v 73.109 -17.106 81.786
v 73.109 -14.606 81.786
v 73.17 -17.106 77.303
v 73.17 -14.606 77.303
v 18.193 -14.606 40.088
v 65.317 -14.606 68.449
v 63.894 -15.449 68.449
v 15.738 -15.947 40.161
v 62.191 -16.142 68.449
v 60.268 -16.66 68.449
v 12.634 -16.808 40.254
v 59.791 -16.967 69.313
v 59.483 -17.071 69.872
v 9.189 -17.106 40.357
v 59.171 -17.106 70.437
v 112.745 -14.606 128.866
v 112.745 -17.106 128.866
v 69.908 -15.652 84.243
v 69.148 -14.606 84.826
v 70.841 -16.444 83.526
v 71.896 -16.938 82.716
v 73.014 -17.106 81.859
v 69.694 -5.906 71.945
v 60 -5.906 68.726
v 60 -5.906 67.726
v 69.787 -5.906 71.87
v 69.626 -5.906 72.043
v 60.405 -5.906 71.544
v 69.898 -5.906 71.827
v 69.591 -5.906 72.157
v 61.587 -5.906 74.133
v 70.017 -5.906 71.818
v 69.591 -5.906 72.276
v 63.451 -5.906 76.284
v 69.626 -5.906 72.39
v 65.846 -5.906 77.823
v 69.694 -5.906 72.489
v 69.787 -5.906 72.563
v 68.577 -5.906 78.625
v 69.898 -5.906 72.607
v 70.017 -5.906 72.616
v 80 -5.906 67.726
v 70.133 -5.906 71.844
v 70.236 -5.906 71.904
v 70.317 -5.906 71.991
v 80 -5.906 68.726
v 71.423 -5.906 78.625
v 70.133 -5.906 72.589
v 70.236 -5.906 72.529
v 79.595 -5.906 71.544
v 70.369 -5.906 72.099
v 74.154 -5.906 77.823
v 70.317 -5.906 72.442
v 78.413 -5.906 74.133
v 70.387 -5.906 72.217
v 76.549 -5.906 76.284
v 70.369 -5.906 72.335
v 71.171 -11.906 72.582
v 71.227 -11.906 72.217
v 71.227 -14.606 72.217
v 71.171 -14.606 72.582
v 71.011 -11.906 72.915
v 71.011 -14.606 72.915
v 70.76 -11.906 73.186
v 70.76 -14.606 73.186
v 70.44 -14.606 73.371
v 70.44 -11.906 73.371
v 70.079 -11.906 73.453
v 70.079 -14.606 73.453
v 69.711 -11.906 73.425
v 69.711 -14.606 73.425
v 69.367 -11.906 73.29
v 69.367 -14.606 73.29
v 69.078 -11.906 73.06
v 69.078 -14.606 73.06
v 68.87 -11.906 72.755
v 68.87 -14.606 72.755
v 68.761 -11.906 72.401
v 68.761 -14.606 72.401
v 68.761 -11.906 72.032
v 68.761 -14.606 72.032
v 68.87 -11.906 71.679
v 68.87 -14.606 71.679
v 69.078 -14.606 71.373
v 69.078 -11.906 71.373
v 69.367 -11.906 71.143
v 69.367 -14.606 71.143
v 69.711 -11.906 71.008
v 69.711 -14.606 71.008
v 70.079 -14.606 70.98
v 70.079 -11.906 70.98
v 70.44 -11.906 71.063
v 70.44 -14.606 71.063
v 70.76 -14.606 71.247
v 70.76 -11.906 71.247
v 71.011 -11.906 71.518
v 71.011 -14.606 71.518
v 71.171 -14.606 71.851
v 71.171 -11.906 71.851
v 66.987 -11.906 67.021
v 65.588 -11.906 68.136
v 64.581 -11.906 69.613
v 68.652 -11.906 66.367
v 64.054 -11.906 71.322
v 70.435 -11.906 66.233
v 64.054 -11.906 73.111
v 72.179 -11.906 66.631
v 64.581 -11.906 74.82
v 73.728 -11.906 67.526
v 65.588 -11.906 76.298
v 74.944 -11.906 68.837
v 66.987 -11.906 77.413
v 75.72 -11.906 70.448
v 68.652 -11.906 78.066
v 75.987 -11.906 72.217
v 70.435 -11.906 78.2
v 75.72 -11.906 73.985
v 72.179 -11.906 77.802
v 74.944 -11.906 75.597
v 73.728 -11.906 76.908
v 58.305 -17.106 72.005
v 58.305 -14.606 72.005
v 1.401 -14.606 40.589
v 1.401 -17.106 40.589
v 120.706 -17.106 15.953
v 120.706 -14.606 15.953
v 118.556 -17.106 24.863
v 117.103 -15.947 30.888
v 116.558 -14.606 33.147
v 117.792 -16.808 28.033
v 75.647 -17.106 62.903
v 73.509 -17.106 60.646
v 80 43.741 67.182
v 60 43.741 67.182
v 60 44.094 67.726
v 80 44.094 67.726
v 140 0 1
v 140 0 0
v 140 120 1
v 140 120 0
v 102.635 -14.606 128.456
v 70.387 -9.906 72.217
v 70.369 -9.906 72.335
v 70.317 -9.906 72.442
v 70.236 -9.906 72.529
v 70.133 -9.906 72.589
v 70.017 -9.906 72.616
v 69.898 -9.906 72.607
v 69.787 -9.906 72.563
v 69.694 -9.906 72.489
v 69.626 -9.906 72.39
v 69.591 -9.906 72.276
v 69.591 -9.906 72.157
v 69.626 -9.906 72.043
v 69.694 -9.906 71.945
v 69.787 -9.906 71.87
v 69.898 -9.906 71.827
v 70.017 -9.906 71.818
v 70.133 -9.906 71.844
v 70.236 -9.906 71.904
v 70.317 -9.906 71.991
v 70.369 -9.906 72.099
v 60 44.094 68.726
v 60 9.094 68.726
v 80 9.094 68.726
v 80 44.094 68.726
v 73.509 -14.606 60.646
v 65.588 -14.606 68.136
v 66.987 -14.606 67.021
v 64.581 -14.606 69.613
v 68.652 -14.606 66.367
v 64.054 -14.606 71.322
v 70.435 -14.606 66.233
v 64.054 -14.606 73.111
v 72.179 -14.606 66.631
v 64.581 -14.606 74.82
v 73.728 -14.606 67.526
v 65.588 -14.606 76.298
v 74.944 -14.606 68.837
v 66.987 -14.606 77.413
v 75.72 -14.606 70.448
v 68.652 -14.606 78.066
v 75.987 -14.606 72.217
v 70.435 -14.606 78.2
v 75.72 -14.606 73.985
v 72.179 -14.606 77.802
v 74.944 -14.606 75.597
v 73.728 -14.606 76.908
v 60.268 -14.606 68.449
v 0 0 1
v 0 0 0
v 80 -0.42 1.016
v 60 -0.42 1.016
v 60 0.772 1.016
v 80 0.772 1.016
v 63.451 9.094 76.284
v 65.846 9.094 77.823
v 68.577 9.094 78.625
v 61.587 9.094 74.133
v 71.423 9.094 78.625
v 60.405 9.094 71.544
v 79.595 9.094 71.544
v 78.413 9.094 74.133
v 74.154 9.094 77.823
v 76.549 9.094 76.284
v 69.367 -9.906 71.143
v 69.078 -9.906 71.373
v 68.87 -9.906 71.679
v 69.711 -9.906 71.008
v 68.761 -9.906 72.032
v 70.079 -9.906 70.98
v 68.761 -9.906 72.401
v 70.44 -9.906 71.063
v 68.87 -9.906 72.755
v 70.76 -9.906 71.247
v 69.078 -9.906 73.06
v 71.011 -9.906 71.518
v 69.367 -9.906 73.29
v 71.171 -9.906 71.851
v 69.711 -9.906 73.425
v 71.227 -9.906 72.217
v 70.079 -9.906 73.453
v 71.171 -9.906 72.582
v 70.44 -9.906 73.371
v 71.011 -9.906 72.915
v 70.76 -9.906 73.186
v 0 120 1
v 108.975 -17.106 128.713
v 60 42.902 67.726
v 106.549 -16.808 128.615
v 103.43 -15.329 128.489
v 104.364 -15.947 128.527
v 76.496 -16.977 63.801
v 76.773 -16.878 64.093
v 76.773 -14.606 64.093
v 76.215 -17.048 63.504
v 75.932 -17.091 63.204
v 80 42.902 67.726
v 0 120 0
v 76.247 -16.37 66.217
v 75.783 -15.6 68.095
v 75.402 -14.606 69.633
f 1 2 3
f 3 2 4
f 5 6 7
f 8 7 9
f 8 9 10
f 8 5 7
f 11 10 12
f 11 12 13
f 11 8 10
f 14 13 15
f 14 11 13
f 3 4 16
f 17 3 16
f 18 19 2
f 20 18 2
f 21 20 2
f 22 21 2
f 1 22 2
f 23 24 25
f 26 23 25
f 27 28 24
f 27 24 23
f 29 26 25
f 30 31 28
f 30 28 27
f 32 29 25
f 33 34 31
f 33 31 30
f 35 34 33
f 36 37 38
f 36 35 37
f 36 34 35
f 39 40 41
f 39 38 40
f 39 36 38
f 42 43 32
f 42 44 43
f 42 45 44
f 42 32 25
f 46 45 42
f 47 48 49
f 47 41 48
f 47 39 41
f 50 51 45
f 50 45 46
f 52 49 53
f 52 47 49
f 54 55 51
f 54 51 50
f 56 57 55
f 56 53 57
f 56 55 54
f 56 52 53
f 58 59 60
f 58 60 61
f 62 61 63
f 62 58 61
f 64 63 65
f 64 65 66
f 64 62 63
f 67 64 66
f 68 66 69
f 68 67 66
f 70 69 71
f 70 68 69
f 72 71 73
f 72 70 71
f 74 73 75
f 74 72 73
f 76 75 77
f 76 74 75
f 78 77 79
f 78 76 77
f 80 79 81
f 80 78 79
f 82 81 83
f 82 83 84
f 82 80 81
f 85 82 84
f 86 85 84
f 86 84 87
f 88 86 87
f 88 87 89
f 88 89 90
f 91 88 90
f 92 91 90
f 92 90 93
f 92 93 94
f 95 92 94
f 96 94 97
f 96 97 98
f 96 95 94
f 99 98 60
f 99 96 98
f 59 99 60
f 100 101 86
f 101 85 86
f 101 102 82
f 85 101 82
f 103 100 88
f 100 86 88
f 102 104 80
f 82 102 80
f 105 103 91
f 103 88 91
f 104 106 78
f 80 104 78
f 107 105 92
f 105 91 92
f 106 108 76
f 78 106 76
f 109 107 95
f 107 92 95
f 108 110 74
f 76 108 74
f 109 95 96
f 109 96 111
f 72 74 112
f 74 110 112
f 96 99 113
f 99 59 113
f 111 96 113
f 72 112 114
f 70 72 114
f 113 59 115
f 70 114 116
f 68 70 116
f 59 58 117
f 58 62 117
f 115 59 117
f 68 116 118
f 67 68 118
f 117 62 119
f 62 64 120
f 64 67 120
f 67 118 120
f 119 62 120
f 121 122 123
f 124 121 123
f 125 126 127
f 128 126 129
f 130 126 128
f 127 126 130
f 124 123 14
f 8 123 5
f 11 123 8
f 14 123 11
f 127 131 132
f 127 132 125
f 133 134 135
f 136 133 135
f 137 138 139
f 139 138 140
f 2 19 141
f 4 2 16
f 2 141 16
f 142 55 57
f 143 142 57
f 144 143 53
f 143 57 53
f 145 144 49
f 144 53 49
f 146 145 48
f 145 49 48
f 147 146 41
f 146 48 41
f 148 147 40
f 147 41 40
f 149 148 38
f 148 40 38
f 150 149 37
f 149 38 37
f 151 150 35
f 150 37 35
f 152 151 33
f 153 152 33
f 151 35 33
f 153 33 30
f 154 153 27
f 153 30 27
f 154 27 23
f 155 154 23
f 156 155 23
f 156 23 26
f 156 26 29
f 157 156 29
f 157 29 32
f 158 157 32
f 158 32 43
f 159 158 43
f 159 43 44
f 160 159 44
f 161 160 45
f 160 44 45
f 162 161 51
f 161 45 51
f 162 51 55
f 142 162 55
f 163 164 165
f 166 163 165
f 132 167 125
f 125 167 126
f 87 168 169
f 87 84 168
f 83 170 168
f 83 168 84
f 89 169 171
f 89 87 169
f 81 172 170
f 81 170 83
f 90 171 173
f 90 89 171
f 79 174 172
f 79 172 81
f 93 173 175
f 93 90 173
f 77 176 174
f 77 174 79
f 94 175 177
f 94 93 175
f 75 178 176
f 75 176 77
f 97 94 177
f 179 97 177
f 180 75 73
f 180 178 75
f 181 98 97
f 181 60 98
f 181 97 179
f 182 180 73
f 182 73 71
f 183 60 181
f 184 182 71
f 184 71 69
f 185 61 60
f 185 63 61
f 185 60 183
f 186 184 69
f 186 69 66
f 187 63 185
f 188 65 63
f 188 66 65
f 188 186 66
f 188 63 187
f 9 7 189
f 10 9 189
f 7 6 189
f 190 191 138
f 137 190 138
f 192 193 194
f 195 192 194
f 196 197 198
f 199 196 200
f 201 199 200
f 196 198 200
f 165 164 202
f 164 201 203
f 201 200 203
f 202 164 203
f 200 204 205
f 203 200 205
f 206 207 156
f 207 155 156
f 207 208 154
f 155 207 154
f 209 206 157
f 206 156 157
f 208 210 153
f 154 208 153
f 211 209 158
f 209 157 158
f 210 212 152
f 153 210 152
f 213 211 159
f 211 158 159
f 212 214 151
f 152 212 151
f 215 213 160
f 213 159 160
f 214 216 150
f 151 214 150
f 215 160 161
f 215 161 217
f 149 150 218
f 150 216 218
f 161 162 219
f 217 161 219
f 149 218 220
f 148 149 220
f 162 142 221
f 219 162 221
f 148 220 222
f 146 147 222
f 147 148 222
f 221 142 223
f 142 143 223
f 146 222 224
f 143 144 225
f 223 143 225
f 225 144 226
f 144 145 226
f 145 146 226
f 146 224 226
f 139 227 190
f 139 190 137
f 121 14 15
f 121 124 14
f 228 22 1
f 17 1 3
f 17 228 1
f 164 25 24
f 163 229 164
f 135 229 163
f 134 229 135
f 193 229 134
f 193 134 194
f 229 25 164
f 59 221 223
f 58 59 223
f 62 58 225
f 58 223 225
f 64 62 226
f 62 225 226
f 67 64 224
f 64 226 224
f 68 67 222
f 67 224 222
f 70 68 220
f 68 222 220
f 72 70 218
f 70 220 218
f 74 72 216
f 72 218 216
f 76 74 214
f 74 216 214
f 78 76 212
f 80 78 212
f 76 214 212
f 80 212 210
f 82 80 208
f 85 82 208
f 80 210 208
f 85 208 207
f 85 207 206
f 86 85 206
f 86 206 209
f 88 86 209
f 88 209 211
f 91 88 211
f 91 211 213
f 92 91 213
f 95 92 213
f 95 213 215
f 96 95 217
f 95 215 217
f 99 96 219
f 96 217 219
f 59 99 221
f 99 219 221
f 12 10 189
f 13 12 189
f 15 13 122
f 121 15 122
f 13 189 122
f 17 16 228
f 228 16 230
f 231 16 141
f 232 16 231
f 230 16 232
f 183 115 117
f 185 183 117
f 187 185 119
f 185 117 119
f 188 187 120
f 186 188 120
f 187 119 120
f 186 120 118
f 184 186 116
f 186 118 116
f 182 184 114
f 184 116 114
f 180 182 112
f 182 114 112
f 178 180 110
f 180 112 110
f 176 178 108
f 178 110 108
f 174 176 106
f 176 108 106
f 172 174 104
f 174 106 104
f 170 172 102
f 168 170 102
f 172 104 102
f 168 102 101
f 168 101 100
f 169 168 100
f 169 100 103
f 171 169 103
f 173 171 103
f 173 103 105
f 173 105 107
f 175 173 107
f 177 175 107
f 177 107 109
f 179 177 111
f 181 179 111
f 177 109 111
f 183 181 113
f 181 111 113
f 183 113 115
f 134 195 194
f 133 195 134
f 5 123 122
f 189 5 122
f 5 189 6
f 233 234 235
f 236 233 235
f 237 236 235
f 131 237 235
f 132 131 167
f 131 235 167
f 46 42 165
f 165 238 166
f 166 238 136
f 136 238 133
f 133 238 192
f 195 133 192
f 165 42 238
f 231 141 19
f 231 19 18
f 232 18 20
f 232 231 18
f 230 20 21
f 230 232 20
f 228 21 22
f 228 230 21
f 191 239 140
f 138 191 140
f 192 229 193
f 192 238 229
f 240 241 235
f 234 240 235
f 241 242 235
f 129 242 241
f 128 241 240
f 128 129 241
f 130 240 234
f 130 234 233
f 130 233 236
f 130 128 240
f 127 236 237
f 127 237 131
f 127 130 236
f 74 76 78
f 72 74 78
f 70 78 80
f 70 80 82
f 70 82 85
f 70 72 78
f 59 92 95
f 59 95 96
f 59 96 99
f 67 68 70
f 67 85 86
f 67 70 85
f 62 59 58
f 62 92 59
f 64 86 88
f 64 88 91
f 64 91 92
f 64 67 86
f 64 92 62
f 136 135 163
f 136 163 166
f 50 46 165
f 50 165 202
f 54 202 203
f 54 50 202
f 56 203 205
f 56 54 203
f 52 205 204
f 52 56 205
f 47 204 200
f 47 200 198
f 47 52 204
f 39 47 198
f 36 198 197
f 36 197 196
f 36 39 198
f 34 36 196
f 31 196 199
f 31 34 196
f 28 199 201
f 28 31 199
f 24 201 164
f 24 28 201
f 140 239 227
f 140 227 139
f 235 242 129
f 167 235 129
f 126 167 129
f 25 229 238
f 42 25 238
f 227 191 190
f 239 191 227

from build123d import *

# Parameters (mm, degrees)
F0_W           = 140
F0_H           = 120
F1_DEPTH       = 1
F4_DEPTH       = 10
F5_W           = 20
F5_H           = 50
F6_DEPTH       = 1
F8_DEPTH       = 15
F9_R           = 0.4
F10_DEPTH      = 4
F11_R          = 1.2398278846
F12_DEPTH      = 2
F13_R          = 6
F13_R_2        = 1.2398278846
F14_DEPTH      = 2.7
F16_DEPTH      = 2.5
F17_T1_DEPTH   = 79.366985862
F17_2_T1_DEPTH = 79.366985862
F17_3_T1_DEPTH = 79.366985862


# Not quite as in the source:
# - a fillet or chamfer that OpenCascade refuses, or shapes differently, is made with other operations: its cross-section is extruded or revolved along the edge and cut away or added


with BuildPart() as f1:
    # F0 (on Top) → F1 (new body)
    with BuildSketch(Plane.XY):
        with Locations((70, 60)):
            Rectangle(F0_W, F0_H)
    extrude(amount=F1_DEPTH)


with BuildPart() as f4:
    # F3 (on offset) → F4 (new body, symmetric)
    with BuildSketch(Plane.YZ.offset(70)):
        Polygon((-0.4200659473, 1.0160847374), (0.7722973455, 1.0160847374), (43.7408067697, 67.1817869472), (44.0944994946, 67.7264259822), (42.9021362018, 67.7264259822), align=None)
    extrude(amount=F4_DEPTH, both=True)

    # F5 (on face) → F6 (join)
    with BuildSketch(Plane.XY.offset(67.7264259822)):
        with Locations((70, 19.0944994946)):
            Rectangle(F5_W, F5_H)
    extrude(amount=F6_DEPTH)

    # F7 (on face) → F8 (join)
    with BuildSketch(Plane.XZ.offset(5.9055005054)):
        with BuildLine():
            Line((60, 68.7264259822), (80, 68.7264259822))
            ThreePointArc((80, 68.7264259822), (70, 78.7264259822), (60, 68.7264259822))
        make_face()
    extrude(amount=-F8_DEPTH)

    # F9 (on face) → F10 (join)
    with BuildSketch(Plane.XZ.offset(5.9055005054)):
        with Locations((69.9867457151, 72.2166821361)):
            Circle(F9_R)
    extrude(amount=F10_DEPTH)

    # F11 (on face) → F12 (join)
    with BuildSketch(Plane.XZ.offset(9.9055005054)):
        with Locations((69.9867457151, 72.2166821361)):
            Circle(F11_R)
    extrude(amount=F12_DEPTH)


with BuildPart() as f14:
    # F13 (on face) → F14 (new body)
    with BuildSketch(Plane.XZ.offset(11.9055005054)):
        with Locations((69.9867457151, 72.2166821361)):
            Circle(F13_R)
        with Locations((69.9867457151, 72.2166821361)):
            Circle(F13_R_2, mode=Mode.SUBTRACT)
    extrude(amount=F14_DEPTH)


with BuildPart() as f16:
    # F15 (on face) → F16 (new body)
    with BuildSketch(Plane.XZ.offset(14.6055005054)):
        Polygon((116.5578424183, 33.1474154847), (75.4019039591, 69.6328746368), (76.7731679631, 64.0930237523), (73.5093057156, 60.6463849545), (120.7056262574, 15.9529030212), align=None)
    extrude(amount=F16_DEPTH)

    # F17: fillet of radius 6 on 1 edges, made by hand

    # F17_s2 → F17_t1 (cut)
    with BuildSketch(Plane(origin=(57.9277089102, 0, -51.3539269506), x_dir=(0, 1, 0), z_dir=(-0.7482897902, 0, 0.6633719846))):
        with BuildLine():
            ThreePointArc((-14.6055005054, -102.1250798215), (-16.4440396314, -99.9902954366), (-17.1055005054, -97.2516826491))
            Line((-17.1055005054, -97.2516826491), (-17.1055005054, -102.1250798215))
            Line((-17.1055005054, -102.1250798215), (-14.6055005054, -102.1250798215))
        make_face()
    extrude(amount=F17_T1_DEPTH, mode=Mode.SUBTRACT)


with BuildPart() as f16b:
    # F15 (on face) → F16, piece 2 (new body)
    with BuildSketch(Plane.XZ.offset(14.6055005054)):
        Polygon((73.1090417788, 81.7856717816), (73.1698371178, 77.3027345465), (112.7452876158, 128.8661296819), (102.6347893563, 128.4564783105), (69.1478697041, 84.825913196), align=None)
    extrude(amount=F16_DEPTH)

    # F17#2: fillet of radius 6 on 1 edges, made by hand

    # F17_2_s2 → F17_2_t1 (cut)
    with BuildSketch(Plane(origin=(107.5084414965, 0, 140.0742172108), x_dir=(0, 1, 0), z_dir=(-0.6088530846, 0, -0.7932830021))):
        with BuildLine():
            ThreePointArc((-14.6055005054, 3.2073107645), (-16.4440396314, 5.3420951494), (-17.1055005054, 8.0807079369))
            Line((-17.1055005054, 8.0807079369), (-17.1055005054, 3.2073107645))
            Line((-17.1055005054, 3.2073107645), (-14.6055005054, 3.2073107645))
        make_face()
    extrude(amount=F17_2_T1_DEPTH, mode=Mode.SUBTRACT)


with BuildPart() as f16c:
    # F15 (on face) → F16, piece 3 (new body)
    with BuildSketch(Plane.XZ.offset(14.6055005054)):
        Polygon((18.1934121118, 40.0880810557), (65.3174607263, 68.4486882808), (60.2683858732, 68.4486882808), (58.3051553434, 72.0047285657), (1.4012531219, 40.5890332532), align=None)
    extrude(amount=F16_DEPTH)

    # F17#3: fillet of radius 6 on 1 edges, made by hand

    # F17_3_s2 → F17_3_t1 (cut)
    with BuildSketch(Plane(origin=(20.6282983072, 0, 12.4147029641), x_dir=(0, 1, 0), z_dir=(0.8568008839, 0, 0.5156474041))):
        with BuildLine():
            ThreePointArc((-14.6055005054, 24.9661175553), (-16.4440396314, 27.1009019401), (-17.1055005054, 29.8395147277))
            Line((-17.1055005054, 29.8395147277), (-17.1055005054, 24.9661175553))
            Line((-17.1055005054, 24.9661175553), (-14.6055005054, 24.9661175553))
        make_face()
    extrude(amount=F17_3_T1_DEPTH, mode=Mode.SUBTRACT)


solid = Compound([f1.part, f4.part, f14.part, f16.part, f16b.part, f16c.part])
